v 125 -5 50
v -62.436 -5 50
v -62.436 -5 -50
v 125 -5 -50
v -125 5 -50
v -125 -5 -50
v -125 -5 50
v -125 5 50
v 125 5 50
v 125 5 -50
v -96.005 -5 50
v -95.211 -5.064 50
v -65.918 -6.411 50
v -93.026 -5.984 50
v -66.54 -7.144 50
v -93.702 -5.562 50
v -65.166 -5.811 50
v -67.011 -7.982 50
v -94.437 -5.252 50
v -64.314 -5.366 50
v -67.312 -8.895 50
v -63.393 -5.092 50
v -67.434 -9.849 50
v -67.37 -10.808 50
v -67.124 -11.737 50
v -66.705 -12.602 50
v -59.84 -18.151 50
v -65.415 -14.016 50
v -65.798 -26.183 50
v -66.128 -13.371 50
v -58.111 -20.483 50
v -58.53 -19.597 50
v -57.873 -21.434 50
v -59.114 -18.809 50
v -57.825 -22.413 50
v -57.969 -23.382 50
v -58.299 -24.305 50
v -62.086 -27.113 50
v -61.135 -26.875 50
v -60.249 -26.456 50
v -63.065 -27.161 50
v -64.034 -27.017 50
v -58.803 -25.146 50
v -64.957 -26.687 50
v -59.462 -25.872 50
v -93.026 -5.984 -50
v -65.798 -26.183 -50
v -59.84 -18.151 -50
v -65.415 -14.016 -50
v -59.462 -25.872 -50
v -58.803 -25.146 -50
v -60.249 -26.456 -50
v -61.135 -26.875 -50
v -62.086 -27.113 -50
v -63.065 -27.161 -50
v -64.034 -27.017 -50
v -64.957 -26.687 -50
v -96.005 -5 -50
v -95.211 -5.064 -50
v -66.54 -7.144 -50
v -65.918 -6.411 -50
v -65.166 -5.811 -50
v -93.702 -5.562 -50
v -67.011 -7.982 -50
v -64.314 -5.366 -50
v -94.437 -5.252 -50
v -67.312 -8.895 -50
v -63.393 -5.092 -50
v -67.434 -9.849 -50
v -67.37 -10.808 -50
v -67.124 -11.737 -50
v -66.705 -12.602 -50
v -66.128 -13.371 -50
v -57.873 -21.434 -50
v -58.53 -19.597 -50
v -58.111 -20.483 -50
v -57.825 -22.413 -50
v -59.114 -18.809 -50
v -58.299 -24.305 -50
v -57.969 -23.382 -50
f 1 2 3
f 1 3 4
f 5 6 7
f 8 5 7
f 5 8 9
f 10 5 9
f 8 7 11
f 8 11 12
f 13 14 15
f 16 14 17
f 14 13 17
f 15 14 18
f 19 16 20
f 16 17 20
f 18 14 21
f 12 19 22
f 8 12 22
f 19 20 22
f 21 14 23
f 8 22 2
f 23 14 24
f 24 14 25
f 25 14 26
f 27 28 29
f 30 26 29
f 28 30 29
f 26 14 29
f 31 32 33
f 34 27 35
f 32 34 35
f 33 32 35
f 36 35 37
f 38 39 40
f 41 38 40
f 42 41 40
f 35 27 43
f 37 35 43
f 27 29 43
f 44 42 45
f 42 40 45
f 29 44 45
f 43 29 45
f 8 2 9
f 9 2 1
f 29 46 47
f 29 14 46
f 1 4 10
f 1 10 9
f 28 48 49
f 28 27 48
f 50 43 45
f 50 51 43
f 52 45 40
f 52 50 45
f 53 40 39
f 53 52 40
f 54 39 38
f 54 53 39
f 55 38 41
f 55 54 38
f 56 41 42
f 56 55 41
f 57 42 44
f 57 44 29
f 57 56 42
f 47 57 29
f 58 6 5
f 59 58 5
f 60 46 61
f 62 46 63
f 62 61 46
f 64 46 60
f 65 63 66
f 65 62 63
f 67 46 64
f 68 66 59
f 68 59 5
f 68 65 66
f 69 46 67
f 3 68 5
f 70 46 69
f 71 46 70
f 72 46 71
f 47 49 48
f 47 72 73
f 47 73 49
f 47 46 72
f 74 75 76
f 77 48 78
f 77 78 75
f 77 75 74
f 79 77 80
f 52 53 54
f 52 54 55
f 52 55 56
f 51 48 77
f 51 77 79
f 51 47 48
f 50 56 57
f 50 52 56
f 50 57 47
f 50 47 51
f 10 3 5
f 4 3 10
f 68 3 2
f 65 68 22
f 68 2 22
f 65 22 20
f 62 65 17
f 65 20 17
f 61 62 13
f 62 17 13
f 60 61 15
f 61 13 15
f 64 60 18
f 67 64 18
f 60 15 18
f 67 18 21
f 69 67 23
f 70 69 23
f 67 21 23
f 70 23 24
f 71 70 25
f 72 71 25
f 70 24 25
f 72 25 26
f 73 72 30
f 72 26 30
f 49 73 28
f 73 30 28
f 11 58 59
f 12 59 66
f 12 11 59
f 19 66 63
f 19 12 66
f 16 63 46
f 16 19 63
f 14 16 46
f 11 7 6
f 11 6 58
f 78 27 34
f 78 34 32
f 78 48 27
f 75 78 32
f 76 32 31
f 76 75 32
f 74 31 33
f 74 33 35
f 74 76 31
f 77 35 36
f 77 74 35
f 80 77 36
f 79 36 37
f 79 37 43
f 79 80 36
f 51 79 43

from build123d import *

# Parameters (mm, degrees)
F0_W     = 250
F0_H     = 100
F1_DEPTH = 5
F4_DEPTH = 50
F5_R     = 5
F6_R     = 4.99999


# Not quite as in the source:
# - two fillets or chamfers of one size are made in one step
# - a fillet or chamfer is up to 0.001 mm smaller than in the source, because OpenCascade refuses the exact size


with BuildPart() as f1:
    # F0 (on Front) → F1 (new body, symmetric)
    with BuildSketch(Plane.XZ):
        Rectangle(F0_W, F0_H)
    extrude(amount=F1_DEPTH, both=True)

    # F3 (on Top) → F4 (join, symmetric)
    with BuildSketch(Plane.XY):
        Polygon((-55.8243768029, -21.1299679096), (-77.5685643683, -5), (-94.3532884121, -5), (-61.7821750806, -29.1614459605), align=None)
    extrude(amount=F4_DEPTH, both=True)

    # F5
    f5_edges = [f1.edges().sort_by_distance(p)[0] for p in [
        (-94.353288, -5, 0),
        (-77.568564, -5, 0),
    ]]
    fillet(f5_edges, radius=F5_R)

    # F6 (radius 5 in the source; OpenCascade refuses exactly that, so slightly less here)
    f6_edges = [f1.edges().sort_by_distance(p)[0] for p in [
        (-61.782175, -29.161446, 0),
        (-55.824377, -21.129968, 0),
    ]]
    fillet(f6_edges, radius=F6_R)


solid = f1.part
